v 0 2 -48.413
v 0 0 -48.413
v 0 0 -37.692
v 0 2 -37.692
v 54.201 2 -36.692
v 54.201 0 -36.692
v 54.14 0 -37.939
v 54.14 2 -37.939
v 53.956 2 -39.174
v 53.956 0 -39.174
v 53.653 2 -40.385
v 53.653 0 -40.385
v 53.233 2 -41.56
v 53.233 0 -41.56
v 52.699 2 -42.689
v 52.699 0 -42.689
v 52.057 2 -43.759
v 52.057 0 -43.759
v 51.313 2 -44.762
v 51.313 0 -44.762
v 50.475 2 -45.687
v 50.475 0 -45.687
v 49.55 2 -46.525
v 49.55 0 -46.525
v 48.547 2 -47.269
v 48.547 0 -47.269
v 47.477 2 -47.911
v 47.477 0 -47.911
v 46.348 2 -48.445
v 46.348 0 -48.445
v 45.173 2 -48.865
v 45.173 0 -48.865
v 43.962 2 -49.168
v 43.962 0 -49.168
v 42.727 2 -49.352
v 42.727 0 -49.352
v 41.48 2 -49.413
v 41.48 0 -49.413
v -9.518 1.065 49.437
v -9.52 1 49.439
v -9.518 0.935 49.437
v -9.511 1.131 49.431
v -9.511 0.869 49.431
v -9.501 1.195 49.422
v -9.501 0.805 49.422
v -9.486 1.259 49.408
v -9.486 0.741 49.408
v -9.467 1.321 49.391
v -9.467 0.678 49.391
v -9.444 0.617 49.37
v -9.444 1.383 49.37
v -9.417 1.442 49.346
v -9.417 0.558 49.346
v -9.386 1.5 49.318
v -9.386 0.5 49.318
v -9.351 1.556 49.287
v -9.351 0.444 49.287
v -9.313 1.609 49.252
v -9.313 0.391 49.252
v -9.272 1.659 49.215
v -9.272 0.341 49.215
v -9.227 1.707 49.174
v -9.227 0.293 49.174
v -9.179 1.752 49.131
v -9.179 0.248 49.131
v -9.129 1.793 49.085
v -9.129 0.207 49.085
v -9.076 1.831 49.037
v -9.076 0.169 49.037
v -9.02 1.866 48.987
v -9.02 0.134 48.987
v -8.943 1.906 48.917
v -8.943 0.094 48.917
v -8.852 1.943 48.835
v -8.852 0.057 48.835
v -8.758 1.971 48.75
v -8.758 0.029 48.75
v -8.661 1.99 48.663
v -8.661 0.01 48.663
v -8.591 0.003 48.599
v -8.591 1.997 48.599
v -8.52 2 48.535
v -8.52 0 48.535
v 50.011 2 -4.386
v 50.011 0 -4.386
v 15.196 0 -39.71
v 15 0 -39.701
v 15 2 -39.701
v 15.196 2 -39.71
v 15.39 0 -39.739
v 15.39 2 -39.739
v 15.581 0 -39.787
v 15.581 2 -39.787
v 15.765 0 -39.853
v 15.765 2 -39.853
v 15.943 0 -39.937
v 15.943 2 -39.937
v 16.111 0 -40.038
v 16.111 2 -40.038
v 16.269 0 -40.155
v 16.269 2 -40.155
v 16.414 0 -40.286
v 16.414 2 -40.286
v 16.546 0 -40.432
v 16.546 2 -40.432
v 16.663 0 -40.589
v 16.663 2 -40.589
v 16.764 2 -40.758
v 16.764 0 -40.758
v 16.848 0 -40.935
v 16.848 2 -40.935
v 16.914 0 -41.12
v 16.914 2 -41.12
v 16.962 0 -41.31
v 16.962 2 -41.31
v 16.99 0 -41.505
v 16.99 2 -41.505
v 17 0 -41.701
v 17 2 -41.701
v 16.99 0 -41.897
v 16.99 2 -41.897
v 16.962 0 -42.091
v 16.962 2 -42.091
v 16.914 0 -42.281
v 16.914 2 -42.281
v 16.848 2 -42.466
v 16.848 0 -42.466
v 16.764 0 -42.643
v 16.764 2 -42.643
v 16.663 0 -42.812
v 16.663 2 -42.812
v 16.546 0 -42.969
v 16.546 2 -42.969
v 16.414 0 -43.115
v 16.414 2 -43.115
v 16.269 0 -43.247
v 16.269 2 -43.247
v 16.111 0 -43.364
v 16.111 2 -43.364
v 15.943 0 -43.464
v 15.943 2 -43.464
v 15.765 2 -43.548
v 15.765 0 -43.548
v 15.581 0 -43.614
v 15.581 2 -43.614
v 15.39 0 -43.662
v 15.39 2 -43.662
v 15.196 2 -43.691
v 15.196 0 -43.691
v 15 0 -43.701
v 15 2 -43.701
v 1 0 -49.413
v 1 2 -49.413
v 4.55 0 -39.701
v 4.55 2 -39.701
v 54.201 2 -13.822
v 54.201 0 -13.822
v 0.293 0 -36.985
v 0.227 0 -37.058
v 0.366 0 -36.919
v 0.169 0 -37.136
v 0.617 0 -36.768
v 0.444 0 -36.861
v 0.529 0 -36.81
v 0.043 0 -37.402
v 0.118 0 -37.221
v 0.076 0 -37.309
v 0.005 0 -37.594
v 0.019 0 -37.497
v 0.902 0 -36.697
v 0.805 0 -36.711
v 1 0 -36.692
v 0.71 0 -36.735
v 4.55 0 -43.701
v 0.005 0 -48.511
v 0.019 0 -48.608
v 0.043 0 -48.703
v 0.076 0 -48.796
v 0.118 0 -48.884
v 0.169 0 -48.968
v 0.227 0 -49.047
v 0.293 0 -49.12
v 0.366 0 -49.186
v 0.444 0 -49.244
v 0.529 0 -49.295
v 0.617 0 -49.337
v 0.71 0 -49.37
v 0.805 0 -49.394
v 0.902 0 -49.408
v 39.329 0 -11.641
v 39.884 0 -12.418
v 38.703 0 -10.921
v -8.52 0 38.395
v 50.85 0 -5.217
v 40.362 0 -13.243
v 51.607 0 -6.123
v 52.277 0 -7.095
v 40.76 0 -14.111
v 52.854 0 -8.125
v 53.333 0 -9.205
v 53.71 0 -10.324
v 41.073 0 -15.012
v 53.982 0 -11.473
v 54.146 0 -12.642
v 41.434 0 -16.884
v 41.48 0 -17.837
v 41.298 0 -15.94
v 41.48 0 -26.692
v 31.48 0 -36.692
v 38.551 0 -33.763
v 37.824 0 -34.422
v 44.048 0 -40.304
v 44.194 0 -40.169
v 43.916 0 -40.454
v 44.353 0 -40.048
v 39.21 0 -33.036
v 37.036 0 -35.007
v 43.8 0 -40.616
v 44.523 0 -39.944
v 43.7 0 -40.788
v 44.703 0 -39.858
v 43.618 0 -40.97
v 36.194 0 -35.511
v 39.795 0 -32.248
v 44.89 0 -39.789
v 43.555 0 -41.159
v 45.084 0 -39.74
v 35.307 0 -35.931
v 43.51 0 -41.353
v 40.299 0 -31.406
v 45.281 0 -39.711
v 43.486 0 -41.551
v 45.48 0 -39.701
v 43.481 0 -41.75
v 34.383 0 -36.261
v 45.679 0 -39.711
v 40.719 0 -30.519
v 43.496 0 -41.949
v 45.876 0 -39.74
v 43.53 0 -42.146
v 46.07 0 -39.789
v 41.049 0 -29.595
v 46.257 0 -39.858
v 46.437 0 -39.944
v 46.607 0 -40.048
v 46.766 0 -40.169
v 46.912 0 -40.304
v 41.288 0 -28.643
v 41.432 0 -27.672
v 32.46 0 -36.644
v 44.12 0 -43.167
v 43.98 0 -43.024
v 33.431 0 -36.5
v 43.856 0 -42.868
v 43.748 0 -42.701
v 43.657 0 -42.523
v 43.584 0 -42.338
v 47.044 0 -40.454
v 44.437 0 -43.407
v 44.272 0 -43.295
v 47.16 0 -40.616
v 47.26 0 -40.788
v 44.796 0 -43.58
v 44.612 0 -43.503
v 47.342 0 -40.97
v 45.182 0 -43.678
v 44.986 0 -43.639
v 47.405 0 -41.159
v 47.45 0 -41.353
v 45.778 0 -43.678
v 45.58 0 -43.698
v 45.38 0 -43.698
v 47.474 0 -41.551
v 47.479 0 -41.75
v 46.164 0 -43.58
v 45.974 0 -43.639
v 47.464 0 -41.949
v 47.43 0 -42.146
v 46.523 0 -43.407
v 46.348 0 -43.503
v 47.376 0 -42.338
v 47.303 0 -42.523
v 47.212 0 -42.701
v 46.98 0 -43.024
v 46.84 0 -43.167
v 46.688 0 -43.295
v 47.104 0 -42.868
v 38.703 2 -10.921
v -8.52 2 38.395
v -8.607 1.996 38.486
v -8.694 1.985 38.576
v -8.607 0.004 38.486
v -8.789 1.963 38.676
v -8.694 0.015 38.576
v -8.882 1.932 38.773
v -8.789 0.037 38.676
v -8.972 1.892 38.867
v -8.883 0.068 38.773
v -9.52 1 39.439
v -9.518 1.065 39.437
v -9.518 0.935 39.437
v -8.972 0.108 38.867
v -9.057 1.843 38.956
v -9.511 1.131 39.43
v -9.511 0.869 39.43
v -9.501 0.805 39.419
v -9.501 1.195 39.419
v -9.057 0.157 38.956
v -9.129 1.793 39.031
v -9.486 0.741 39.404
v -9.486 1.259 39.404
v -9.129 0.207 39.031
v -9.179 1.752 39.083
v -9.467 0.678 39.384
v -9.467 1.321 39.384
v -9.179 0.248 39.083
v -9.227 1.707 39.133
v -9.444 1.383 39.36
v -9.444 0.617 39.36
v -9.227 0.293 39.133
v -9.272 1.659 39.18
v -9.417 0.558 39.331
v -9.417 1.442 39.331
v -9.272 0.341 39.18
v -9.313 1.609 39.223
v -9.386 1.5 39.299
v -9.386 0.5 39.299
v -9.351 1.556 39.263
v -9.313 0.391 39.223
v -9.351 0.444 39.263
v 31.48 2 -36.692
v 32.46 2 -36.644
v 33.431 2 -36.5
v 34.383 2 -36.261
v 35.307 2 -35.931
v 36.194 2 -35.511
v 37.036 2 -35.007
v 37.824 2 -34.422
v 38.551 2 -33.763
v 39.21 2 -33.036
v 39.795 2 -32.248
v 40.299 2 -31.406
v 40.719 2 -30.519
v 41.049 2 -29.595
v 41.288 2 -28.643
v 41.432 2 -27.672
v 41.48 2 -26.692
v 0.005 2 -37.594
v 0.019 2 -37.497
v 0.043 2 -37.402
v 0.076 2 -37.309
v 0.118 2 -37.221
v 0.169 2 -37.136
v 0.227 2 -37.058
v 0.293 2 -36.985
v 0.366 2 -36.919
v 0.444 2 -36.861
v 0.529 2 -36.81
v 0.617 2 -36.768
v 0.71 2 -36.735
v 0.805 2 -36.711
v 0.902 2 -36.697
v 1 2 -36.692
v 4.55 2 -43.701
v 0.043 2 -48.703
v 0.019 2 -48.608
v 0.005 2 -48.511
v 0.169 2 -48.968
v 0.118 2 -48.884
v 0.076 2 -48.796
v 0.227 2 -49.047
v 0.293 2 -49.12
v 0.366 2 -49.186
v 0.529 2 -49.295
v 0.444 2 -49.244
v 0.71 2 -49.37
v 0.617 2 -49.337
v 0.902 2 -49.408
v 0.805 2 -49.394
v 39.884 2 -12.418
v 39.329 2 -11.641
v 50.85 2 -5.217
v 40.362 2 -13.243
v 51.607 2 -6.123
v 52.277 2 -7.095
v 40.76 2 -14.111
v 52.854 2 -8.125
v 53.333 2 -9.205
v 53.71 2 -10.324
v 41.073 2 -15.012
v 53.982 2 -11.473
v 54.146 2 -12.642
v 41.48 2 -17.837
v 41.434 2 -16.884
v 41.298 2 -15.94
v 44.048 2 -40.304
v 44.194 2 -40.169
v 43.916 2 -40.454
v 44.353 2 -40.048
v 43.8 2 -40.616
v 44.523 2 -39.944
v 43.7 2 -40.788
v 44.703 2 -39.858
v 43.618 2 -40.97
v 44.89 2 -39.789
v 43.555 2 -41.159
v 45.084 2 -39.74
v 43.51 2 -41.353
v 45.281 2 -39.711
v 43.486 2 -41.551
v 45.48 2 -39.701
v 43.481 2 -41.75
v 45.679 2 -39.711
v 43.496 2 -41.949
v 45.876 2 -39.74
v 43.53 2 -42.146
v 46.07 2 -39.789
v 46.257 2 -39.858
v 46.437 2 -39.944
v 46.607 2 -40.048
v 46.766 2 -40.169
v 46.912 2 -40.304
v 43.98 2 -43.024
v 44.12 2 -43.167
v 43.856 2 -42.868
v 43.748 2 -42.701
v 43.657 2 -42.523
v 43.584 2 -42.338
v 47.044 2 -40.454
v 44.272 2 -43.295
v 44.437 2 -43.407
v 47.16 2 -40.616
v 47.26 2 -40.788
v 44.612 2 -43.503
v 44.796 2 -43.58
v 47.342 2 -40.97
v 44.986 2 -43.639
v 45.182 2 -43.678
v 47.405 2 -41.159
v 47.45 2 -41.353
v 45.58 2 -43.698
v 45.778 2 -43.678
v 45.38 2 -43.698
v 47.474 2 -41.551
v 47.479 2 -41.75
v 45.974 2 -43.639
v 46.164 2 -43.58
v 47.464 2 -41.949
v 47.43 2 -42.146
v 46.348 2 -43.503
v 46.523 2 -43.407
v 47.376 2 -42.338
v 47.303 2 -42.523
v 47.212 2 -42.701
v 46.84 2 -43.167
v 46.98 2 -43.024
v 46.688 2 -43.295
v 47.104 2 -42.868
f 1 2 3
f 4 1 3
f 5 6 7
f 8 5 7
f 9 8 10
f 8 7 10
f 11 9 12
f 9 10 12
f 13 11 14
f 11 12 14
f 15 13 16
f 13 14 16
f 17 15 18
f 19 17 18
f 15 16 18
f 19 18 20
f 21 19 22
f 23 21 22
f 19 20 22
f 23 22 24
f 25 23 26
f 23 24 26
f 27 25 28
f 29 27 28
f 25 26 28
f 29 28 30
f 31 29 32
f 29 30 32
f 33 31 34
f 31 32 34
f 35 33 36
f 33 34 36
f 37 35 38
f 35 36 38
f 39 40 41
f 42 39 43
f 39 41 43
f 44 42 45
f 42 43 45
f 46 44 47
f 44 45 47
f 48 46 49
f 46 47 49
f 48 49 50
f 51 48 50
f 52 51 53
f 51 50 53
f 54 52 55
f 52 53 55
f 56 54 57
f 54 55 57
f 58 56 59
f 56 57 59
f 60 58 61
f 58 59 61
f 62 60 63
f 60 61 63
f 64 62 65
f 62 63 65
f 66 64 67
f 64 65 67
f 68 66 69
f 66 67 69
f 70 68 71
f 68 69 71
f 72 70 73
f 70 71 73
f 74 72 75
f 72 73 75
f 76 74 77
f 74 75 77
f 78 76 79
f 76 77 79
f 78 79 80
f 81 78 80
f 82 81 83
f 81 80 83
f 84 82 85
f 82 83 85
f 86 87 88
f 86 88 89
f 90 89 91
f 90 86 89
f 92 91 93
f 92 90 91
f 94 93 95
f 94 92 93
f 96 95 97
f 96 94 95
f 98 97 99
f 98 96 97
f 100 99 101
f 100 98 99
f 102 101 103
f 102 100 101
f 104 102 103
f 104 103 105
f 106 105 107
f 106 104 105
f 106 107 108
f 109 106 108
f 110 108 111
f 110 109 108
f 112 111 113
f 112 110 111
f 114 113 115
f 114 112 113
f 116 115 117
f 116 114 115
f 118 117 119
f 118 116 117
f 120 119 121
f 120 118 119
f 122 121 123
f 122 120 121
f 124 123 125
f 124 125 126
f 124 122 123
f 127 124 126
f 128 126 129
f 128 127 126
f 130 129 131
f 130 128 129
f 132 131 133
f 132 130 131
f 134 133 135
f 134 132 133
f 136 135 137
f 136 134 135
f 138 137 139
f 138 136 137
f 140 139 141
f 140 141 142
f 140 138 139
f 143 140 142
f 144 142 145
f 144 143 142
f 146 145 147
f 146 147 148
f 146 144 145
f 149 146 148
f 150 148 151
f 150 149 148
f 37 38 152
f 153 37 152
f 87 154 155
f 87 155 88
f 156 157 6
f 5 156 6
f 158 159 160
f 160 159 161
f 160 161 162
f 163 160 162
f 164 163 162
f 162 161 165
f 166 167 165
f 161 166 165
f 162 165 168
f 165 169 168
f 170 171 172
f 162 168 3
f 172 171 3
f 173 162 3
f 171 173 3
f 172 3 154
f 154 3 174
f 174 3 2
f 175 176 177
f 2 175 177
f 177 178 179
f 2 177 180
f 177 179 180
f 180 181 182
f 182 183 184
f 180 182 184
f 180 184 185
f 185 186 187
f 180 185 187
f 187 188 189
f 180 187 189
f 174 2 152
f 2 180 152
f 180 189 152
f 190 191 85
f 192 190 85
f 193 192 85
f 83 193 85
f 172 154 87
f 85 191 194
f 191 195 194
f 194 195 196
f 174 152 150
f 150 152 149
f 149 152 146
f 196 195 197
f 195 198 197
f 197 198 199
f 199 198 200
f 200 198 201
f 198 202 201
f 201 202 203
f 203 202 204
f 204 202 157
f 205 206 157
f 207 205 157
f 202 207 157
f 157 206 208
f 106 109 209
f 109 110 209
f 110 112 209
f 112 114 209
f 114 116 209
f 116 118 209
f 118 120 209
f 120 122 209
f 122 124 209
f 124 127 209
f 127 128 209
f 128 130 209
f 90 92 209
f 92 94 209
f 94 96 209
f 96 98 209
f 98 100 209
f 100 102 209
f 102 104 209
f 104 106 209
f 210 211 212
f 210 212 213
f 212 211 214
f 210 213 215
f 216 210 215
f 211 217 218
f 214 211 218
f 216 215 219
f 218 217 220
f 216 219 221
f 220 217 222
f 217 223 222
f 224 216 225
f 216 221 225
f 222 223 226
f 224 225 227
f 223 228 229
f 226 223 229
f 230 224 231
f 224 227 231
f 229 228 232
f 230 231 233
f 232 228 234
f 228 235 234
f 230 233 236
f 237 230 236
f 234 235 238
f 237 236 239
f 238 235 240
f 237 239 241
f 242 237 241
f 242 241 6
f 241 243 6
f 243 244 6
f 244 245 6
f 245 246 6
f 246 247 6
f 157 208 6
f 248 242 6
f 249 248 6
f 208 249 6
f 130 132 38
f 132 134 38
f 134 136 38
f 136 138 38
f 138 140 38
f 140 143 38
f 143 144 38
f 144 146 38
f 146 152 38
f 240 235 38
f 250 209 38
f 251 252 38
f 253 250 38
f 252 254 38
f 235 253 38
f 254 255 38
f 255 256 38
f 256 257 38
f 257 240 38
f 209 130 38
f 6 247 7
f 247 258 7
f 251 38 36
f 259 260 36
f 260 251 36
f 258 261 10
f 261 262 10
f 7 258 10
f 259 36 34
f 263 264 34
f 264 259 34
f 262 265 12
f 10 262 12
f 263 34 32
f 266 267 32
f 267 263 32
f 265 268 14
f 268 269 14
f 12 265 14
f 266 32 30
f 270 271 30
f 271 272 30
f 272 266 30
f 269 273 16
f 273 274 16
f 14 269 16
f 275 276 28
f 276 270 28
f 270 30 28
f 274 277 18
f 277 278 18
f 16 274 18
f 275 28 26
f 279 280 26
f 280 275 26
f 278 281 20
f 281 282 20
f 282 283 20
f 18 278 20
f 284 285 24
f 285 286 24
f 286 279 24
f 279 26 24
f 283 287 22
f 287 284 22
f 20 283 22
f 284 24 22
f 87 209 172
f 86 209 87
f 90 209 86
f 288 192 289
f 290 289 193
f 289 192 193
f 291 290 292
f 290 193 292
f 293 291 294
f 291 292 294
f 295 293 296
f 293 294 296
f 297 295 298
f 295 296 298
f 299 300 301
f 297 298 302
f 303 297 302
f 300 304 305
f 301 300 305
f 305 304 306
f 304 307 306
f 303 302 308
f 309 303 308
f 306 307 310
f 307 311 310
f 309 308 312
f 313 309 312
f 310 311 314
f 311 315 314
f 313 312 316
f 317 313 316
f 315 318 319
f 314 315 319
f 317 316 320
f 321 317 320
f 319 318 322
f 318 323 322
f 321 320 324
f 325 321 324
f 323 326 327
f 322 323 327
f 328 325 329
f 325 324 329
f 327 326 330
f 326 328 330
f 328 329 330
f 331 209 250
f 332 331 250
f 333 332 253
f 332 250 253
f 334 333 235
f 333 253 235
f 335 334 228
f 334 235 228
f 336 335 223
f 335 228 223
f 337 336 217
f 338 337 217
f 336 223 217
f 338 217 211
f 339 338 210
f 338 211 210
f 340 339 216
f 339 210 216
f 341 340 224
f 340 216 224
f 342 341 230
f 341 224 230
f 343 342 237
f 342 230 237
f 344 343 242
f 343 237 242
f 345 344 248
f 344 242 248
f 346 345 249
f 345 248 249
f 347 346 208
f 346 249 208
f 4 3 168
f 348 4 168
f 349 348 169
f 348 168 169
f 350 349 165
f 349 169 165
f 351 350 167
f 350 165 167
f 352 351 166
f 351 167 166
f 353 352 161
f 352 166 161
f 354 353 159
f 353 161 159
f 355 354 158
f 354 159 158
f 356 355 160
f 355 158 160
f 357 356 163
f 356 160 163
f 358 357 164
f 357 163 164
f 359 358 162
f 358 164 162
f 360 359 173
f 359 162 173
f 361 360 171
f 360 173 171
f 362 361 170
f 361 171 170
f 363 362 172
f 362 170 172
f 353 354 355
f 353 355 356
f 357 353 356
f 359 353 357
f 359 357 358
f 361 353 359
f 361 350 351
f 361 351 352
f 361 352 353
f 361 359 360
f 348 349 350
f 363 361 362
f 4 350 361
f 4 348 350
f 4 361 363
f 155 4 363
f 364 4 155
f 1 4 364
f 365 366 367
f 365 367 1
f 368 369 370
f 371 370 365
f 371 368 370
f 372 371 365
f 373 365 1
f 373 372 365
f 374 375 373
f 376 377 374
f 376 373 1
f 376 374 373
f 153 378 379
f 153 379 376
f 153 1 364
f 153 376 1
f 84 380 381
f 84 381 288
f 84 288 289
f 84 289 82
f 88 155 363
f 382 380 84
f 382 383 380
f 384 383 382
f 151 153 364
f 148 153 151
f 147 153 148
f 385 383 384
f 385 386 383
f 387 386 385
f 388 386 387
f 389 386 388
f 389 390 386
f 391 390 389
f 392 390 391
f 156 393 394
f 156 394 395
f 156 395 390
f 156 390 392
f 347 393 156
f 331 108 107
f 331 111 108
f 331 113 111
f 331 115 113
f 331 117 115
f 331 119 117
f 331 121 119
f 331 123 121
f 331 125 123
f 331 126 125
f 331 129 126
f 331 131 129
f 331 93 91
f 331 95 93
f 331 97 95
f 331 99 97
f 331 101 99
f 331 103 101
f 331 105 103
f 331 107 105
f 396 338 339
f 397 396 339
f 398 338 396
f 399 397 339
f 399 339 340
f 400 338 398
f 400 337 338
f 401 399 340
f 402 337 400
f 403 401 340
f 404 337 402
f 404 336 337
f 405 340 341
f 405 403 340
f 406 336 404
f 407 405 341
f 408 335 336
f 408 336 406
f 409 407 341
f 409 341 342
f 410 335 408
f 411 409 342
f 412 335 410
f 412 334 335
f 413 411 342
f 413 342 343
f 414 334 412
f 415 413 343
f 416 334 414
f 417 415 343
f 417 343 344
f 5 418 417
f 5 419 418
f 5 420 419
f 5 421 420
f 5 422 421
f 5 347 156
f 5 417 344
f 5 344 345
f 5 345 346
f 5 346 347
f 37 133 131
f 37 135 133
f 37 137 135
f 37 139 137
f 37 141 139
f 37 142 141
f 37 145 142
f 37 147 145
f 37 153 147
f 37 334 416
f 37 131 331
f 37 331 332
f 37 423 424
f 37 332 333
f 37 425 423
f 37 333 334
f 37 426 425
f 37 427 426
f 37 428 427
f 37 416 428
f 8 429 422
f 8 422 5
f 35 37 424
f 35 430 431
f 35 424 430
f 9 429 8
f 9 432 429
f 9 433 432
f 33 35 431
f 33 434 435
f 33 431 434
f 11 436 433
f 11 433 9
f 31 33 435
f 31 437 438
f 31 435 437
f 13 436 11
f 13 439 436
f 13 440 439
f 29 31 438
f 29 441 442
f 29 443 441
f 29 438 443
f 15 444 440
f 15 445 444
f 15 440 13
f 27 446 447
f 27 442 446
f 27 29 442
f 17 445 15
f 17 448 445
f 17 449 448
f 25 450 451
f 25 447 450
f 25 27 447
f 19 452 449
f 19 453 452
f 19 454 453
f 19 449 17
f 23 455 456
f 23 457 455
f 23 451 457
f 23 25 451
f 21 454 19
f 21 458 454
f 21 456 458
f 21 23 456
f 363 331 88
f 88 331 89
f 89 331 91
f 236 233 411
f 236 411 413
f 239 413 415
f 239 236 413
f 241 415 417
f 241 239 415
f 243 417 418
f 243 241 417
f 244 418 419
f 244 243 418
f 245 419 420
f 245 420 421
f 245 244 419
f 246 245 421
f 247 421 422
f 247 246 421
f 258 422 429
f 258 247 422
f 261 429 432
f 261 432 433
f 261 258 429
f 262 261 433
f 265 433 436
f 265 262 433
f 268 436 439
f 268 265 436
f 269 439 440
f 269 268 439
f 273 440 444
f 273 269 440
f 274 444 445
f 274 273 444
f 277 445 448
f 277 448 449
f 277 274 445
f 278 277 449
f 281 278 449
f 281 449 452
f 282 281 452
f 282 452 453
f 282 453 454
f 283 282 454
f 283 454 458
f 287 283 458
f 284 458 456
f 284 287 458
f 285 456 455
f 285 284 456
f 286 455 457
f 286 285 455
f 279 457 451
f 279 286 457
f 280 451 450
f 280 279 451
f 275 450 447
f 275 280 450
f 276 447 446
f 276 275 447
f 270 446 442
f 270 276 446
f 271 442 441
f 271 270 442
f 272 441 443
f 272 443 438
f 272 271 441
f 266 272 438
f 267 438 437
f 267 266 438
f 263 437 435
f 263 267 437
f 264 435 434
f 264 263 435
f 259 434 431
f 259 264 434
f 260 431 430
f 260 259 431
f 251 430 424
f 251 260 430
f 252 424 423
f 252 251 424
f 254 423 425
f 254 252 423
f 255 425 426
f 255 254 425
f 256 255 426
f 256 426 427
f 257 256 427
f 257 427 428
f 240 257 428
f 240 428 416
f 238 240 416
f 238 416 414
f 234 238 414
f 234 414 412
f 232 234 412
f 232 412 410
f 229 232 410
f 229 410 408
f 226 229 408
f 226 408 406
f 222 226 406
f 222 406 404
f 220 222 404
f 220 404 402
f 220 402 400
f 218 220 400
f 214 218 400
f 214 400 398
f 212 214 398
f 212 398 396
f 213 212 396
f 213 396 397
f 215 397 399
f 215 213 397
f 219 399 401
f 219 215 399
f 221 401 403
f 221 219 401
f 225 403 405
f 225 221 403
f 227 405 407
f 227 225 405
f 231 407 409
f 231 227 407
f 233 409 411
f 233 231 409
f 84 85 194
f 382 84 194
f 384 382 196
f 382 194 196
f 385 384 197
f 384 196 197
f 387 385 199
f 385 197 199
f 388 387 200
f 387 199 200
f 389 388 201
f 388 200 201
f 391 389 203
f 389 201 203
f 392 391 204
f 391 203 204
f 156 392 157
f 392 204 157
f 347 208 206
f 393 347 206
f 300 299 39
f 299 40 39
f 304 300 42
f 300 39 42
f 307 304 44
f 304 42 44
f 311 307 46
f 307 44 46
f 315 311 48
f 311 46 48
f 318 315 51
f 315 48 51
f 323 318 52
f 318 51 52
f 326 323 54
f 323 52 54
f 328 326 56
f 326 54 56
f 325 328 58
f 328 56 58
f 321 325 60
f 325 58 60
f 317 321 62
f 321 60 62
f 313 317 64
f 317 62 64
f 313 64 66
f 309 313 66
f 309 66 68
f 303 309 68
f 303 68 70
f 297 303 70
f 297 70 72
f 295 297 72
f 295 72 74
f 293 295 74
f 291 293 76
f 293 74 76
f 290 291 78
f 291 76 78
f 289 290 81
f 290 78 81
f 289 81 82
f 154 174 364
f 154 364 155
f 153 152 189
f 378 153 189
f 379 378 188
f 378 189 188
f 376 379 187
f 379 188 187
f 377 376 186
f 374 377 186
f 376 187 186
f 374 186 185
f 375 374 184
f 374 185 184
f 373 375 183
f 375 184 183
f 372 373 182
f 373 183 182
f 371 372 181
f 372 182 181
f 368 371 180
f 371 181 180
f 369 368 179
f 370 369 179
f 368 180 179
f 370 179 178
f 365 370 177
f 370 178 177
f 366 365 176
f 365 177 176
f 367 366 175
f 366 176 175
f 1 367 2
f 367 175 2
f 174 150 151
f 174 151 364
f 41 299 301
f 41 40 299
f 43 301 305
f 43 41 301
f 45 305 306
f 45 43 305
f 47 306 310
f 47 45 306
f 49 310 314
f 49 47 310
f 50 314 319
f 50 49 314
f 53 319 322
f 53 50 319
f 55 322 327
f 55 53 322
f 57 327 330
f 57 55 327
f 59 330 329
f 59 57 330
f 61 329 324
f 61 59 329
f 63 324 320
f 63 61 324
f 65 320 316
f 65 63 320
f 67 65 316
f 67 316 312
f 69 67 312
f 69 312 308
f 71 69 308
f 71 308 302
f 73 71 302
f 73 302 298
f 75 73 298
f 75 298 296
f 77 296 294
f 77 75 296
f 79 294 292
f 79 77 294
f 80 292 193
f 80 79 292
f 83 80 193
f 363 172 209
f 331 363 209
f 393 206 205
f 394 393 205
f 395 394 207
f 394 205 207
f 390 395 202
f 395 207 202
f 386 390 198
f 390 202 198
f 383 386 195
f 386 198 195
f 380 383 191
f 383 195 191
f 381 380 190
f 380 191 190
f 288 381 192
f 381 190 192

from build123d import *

# Parameters (mm, degrees)
SKETCH1_R           = 2
BOSS_EXTRUDE2_DEPTH = 2
FILLET1_R           = 1
FILLET2_R           = 1


with BuildPart() as part:
    # Sketch1 → Boss-Extrude2 (new body)
    with BuildSketch(Plane(origin=(0, 0, 0), x_dir=(1, 0, 0), z_dir=(0, 1, 0))):
        with BuildLine():
            Line((0, 48.412862342), (0, 37.692030173))
            ThreePointArc((0, 37.692030173), (0.292893219, 36.984923392), (1, 36.692030173))
            Line((1, 36.692030173), (31.48, 36.692030173))
            ThreePointArc((31.48, 36.692030173), (38.551067812, 33.763097985), (41.48, 26.692030173))
            Line((41.48, 26.692030173), (41.48, 17.837278162))
            ThreePointArc((41.48, 17.837278162), (40.75973427, 14.11081444), (38.702693625, 10.92115954))
            Line((38.702693625, 10.92115954), (-9.52, -39.4391308))
            Line((-9.52, -39.4391308), (-9.52, -49.4391308))
            Line((-9.52, -49.4391308), (50.011362769, 4.385719046))
            ThreePointArc((50.011362769, 4.385719046), (53.106383896, 8.659526457), (54.200832168, 13.821577266))
            Line((54.200832168, 13.821577266), (54.200832168, 36.692030173))
            ThreePointArc((54.200832168, 36.692030173), (50.474986688, 45.687016862), (41.48, 49.412862342))
            Line((41.48, 49.412862342), (1, 49.412862342))
            ThreePointArc((1, 49.412862342), (0.292893219, 49.119969123), (0, 48.412862342))
        make_face()
        with Locations(Location((45.48, 41.700609081, 0), (0, 0, 270))):
            Circle(SKETCH1_R, mode=Mode.SUBTRACT)
        with BuildLine():
            Line((15, 43.700609081), (4.549516448, 43.700609081))
            Line((4.549516448, 43.700609081), (4.549516448, 39.700609081))
            Line((4.549516448, 39.700609081), (15, 39.700609081))
            ThreePointArc((15, 39.700609081), (17, 41.700609081), (15, 43.700609081))
        make_face(mode=Mode.SUBTRACT)
    extrude(amount=BOSS_EXTRUDE2_DEPTH)

    # Fillet1
    fillet1_edges = [part.edges().sort_by_distance(p)[0] for p in [
        (-9.52, 2, 44.4391308),
    ]]
    fillet(fillet1_edges, radius=FILLET1_R)

    # Fillet2
    fillet2_edges = [part.edges().sort_by_distance(p)[0] for p in [
        (-9.52, 0, 44.4391308),
    ]]
    fillet(fillet2_edges, radius=FILLET2_R - 0.0001)  # a hair under: the kernel refuses the full size


solid = part.part
